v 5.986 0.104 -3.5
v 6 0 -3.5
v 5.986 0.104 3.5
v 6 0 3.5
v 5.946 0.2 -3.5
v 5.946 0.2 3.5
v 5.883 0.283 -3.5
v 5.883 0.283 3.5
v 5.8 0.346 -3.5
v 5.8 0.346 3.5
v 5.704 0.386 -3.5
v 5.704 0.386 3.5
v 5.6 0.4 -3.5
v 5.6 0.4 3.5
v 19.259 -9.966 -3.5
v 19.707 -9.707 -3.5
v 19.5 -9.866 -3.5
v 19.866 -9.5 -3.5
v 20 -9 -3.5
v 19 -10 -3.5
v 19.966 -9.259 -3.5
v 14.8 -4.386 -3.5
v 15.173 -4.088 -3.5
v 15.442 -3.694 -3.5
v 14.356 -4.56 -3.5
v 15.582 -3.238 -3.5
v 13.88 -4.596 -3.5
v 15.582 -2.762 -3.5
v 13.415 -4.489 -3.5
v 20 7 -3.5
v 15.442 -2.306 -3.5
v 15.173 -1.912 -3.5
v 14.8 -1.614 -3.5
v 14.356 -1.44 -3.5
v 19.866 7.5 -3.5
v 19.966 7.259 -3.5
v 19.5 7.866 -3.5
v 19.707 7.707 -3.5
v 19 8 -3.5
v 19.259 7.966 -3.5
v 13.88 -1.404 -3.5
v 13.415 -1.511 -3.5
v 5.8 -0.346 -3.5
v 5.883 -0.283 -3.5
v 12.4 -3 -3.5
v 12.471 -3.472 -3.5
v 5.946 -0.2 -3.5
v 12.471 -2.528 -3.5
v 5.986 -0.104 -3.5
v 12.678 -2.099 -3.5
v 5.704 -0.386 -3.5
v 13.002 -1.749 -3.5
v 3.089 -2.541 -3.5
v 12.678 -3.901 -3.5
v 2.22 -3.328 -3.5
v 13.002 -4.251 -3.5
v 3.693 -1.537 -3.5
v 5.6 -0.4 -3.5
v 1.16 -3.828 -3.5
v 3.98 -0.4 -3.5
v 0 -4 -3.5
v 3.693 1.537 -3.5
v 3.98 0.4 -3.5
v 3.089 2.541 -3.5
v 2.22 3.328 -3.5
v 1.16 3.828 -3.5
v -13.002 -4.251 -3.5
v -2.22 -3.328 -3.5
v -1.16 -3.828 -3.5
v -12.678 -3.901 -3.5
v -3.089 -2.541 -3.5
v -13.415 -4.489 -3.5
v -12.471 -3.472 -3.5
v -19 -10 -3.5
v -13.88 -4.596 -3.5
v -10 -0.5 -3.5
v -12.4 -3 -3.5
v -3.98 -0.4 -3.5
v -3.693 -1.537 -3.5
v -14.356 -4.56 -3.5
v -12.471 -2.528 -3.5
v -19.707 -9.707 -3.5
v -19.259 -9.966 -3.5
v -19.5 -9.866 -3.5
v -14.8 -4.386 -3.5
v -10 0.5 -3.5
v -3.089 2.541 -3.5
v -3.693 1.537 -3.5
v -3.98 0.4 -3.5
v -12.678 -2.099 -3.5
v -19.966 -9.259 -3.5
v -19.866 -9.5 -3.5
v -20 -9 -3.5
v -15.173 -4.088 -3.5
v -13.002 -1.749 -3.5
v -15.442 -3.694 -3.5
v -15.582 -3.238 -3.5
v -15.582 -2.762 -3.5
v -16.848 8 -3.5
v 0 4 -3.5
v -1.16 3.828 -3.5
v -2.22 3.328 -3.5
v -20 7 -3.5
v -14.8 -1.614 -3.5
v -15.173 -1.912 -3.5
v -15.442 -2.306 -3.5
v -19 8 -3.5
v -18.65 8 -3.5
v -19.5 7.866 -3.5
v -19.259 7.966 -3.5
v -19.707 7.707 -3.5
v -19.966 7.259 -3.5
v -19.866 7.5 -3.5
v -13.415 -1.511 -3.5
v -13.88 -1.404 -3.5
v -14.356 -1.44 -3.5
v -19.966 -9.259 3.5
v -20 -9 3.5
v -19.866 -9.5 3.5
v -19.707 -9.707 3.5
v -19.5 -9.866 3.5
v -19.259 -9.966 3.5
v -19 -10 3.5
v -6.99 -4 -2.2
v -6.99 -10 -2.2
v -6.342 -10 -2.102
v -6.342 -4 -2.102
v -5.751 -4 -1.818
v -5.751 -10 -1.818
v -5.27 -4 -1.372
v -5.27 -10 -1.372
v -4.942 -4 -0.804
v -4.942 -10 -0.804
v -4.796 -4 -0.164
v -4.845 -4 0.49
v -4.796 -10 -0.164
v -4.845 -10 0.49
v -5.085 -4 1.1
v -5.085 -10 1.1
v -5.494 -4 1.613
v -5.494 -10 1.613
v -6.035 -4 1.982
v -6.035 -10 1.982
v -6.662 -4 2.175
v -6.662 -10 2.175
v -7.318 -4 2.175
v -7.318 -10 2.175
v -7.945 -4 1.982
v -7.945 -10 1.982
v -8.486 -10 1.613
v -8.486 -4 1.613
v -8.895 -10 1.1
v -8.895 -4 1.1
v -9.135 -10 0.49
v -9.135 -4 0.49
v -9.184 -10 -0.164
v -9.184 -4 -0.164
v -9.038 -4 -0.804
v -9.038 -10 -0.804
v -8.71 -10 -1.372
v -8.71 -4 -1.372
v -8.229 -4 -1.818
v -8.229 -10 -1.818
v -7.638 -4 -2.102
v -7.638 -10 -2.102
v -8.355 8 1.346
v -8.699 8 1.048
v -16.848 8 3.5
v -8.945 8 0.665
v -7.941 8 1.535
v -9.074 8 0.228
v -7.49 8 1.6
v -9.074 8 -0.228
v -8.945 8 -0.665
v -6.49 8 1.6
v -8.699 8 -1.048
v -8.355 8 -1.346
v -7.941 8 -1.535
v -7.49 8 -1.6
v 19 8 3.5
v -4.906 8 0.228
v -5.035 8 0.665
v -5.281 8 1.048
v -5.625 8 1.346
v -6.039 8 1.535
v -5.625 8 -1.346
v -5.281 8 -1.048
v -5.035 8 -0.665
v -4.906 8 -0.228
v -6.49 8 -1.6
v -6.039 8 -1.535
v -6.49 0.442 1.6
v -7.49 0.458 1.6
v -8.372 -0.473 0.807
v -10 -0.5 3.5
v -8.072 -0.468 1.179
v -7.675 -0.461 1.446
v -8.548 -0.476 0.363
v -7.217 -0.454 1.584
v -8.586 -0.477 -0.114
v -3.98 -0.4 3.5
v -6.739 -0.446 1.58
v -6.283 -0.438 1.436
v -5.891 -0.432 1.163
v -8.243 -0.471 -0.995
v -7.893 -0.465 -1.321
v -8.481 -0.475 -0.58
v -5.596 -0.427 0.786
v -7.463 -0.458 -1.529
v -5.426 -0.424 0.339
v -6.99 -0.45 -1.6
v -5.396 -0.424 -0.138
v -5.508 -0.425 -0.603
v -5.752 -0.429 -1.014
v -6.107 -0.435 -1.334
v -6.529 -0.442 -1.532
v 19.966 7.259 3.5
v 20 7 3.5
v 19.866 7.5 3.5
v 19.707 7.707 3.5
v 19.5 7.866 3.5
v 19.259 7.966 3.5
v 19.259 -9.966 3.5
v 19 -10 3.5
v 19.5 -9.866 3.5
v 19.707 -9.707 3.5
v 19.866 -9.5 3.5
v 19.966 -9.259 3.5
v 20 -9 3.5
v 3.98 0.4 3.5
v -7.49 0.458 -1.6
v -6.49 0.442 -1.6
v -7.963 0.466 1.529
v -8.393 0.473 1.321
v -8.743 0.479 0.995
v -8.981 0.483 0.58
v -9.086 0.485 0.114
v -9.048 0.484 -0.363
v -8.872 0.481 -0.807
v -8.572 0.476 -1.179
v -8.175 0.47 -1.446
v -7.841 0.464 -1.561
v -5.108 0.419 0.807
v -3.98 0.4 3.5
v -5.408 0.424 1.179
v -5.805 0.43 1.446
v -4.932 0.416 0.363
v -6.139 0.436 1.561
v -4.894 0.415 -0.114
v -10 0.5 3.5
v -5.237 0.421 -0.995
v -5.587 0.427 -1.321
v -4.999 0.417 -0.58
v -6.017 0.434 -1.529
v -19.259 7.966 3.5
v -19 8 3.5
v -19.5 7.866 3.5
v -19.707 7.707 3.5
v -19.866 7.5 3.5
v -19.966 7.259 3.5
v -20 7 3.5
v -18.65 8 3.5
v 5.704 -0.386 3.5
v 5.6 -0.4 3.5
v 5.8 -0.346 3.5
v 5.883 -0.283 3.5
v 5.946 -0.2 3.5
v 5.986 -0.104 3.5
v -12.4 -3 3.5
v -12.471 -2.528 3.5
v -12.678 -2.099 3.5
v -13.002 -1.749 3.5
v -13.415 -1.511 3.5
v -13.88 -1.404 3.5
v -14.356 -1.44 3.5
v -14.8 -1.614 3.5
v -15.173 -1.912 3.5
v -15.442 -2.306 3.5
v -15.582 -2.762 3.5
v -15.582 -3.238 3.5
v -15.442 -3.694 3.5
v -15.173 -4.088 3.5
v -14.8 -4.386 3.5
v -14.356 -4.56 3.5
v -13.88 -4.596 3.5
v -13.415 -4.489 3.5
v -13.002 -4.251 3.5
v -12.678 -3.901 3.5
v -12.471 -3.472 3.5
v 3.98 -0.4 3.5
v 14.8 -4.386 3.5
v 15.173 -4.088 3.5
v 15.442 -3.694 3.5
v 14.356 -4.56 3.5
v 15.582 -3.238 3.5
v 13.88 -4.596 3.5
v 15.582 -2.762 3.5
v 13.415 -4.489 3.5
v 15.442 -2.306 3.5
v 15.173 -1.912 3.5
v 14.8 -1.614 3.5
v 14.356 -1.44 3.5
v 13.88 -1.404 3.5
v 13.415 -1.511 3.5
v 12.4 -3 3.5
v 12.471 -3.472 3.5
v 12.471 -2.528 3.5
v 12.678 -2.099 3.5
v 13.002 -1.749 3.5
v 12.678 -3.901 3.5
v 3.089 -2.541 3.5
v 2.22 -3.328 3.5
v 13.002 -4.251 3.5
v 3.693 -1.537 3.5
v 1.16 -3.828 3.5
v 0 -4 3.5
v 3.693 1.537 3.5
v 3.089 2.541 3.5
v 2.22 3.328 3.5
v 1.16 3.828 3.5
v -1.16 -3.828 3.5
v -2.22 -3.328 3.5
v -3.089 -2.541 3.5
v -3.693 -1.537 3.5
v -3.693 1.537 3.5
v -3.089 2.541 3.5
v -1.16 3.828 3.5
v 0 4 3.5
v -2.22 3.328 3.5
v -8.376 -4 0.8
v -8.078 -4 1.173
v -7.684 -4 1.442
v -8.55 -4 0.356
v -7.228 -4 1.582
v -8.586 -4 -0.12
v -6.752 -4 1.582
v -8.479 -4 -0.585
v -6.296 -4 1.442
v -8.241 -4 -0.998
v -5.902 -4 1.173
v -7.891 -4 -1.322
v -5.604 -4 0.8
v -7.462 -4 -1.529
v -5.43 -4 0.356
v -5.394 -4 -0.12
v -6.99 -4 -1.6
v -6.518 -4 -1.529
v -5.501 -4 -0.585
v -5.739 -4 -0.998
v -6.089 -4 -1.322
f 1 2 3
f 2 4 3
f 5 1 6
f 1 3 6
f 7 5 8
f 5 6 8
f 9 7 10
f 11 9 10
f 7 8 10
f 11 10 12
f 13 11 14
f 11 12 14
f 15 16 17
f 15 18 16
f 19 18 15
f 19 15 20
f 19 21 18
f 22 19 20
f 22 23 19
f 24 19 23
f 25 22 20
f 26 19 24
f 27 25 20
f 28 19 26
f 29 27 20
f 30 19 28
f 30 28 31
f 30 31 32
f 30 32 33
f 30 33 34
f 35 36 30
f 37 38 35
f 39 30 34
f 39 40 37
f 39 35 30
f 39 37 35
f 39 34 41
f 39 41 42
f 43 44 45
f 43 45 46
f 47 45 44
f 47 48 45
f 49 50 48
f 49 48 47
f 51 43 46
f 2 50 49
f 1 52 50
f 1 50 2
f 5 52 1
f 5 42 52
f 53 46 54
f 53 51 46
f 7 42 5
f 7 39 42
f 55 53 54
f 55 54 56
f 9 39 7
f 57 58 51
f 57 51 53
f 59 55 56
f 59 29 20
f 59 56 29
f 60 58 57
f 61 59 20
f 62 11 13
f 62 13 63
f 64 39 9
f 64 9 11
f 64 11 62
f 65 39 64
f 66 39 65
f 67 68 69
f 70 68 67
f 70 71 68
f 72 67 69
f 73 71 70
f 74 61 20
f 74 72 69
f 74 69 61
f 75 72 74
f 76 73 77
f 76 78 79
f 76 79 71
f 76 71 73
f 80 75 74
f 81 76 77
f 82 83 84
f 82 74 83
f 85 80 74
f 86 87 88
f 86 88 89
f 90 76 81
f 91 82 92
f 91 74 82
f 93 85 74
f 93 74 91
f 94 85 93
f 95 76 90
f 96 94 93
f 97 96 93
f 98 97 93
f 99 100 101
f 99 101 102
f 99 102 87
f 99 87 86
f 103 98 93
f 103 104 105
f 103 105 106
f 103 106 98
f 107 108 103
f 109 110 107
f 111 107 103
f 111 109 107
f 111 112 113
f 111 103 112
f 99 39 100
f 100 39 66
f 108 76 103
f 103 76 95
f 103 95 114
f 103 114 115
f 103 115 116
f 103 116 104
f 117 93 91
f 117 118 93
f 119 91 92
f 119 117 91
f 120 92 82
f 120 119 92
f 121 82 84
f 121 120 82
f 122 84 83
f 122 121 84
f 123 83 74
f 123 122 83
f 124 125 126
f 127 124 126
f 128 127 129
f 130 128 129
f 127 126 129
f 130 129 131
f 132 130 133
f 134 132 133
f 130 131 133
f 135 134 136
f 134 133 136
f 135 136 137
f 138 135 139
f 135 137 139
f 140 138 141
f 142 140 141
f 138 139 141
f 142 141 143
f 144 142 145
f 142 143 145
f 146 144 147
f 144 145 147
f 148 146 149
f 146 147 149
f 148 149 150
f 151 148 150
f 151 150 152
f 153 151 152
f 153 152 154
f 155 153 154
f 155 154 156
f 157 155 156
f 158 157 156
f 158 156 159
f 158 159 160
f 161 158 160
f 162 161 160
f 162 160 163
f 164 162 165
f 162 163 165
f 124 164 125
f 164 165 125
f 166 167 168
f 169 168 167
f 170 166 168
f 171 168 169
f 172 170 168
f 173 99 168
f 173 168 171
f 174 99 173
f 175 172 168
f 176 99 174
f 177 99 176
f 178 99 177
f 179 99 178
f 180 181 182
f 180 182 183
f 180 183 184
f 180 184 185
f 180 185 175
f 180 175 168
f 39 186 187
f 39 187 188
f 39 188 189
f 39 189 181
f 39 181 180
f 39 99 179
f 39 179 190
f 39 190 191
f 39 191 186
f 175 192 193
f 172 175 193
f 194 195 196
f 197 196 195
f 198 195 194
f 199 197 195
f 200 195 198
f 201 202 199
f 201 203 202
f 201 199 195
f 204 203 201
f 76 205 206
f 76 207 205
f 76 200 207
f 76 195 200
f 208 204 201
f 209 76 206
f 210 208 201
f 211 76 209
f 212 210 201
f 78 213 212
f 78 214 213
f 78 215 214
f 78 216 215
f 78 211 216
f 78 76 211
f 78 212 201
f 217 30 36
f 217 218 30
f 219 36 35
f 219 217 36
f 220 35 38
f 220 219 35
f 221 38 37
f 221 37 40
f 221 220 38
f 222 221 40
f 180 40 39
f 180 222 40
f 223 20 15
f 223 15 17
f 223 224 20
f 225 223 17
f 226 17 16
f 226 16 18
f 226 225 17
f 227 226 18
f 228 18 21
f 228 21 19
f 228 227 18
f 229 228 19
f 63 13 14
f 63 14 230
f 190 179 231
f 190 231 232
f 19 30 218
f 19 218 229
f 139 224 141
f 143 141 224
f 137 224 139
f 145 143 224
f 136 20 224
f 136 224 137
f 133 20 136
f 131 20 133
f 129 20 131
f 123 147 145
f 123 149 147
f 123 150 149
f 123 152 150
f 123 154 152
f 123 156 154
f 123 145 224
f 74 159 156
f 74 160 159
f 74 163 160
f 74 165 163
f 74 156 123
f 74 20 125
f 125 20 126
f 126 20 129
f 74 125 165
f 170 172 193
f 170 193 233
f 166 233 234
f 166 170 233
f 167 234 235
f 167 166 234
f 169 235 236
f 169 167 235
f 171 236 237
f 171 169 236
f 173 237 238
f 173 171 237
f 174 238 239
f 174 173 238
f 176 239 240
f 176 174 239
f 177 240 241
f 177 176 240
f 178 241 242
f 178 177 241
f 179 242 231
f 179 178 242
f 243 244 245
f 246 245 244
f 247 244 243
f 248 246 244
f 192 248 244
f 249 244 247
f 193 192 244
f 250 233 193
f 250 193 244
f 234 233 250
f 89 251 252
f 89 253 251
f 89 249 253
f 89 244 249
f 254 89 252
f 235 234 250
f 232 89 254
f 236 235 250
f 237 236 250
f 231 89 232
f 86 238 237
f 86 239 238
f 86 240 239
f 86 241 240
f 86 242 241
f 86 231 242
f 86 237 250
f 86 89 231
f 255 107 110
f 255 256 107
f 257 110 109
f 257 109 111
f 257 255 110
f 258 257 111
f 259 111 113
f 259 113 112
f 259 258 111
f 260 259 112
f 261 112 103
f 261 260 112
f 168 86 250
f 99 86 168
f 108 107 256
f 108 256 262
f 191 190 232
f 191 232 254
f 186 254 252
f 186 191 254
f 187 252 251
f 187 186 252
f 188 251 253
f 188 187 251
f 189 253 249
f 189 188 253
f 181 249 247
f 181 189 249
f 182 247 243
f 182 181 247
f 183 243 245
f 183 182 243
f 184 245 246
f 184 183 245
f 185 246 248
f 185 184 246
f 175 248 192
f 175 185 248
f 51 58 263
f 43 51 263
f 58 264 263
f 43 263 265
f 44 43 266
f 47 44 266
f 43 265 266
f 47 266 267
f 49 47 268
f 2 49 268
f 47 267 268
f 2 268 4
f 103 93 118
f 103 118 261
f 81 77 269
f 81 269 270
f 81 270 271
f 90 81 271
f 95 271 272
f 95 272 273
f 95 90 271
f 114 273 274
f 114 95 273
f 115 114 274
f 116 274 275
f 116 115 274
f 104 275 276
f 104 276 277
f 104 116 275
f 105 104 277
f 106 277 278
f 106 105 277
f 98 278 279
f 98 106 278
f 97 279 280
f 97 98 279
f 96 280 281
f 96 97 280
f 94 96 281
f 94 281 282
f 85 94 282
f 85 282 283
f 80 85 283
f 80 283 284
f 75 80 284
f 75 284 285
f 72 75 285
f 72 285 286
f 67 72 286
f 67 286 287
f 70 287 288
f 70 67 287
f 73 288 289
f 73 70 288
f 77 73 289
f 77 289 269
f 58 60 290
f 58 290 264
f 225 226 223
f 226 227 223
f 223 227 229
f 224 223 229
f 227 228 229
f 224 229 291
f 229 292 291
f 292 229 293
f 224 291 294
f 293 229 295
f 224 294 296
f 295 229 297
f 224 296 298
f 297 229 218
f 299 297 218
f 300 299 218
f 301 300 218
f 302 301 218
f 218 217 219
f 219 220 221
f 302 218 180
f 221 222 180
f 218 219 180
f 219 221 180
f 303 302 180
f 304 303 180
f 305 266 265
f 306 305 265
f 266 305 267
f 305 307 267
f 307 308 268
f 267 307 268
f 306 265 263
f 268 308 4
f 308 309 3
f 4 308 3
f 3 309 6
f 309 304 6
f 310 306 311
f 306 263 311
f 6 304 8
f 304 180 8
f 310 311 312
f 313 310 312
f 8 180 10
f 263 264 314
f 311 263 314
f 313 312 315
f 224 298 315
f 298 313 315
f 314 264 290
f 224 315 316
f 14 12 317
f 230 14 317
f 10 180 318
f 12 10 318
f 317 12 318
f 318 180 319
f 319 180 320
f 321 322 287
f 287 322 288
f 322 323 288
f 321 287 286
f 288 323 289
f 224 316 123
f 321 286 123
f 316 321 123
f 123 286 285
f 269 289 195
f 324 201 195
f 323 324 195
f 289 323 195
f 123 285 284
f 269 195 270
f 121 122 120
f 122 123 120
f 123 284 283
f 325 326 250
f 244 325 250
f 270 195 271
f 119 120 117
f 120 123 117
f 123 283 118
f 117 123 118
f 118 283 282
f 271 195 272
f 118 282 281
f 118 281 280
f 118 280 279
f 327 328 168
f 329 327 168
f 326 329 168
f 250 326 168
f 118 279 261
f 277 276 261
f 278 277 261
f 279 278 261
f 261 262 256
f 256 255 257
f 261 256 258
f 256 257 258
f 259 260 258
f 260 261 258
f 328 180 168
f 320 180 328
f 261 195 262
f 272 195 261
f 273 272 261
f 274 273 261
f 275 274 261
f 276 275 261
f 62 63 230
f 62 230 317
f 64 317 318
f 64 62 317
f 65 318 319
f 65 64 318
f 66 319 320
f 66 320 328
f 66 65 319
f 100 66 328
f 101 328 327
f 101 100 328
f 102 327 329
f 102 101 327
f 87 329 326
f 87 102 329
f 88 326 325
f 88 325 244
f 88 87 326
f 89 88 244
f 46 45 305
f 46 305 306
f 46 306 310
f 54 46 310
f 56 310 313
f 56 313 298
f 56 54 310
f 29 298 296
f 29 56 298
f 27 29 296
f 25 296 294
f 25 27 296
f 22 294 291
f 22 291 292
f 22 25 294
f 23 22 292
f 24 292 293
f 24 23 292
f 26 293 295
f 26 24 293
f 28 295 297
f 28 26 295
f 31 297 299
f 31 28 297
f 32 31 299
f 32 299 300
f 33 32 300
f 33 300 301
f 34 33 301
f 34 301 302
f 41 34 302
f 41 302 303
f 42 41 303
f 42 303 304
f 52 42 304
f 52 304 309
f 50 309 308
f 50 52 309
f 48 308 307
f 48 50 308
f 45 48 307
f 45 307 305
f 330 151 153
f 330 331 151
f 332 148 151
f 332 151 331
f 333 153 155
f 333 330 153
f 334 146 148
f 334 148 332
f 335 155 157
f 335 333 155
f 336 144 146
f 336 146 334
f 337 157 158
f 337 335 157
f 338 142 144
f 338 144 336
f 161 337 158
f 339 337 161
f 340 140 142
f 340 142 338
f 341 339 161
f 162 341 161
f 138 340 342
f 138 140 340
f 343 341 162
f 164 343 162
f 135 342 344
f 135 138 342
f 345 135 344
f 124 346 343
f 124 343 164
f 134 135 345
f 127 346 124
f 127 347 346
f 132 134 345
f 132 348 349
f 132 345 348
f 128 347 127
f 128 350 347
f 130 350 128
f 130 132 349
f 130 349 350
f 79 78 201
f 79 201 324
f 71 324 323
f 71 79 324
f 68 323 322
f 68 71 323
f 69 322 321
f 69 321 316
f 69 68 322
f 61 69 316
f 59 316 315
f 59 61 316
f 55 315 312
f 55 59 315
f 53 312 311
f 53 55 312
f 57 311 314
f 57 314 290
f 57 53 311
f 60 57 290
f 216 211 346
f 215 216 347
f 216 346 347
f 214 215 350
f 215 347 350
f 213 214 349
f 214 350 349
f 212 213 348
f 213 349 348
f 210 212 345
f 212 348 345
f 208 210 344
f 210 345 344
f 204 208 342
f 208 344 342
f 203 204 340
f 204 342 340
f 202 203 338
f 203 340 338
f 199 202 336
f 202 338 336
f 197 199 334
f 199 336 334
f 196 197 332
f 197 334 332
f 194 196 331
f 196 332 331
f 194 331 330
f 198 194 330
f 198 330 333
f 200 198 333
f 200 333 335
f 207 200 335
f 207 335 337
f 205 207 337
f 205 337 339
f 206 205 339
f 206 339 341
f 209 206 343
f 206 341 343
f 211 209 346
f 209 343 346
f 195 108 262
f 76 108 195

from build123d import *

# Parameters (mm, degrees)
BOSS_EXTRUDE1_DEPTH      = 3.5
BOSS_EXTRUDE1_DEPTH_BACK = 3.5
SKETCH1_R                = 1.6
CUT_EXTRUDE1_REACH       = 29.134
SKETCH3_R                = 1.6
SKETCH3_3_R              = 2.2
SKETCH3_3_R_2            = 1.6
CUT_EXTRUDE2_DEPTH       = 6
CUT_EXTRUDE3_REACH       = 29.134
FILLET1_R                = 1
FILLET2_R                = 0.4


with BuildPart() as part:
    # Sketch1 → Boss-Extrude1 (new, two sides: drawn at the far end of the back side and taken through both)
    with BuildSketch(Plane.XY.offset(-BOSS_EXTRUDE1_DEPTH_BACK)):
        with BuildLine():
            Line((-20, 8), (-18.64966284, 8))
            Line((-18.64966284, 8), (-10, -0.5))
            Line((-10, -0.5), (-3.979949748, -0.4))
            ThreePointArc((-3.979949748, -0.4), (0, -4), (3.979949748, -0.4))
            Line((3.979949748, -0.4), (6, -0.4))
            Line((6, -0.4), (6, 0.4))
            Line((6, 0.4), (3.979949748, 0.4))
            ThreePointArc((3.979949748, 0.4), (0, 4), (-3.979949748, 0.4))
            Line((-3.979949748, 0.4), (-10, 0.5))
            Line((-10, 0.5), (-16.848441102, 8))
            Line((-16.848441102, 8), (20, 8))
            Line((20, 8), (20, -10))
            Line((20, -10), (-20, -10))
            Line((-20, -10), (-20, 8))
        make_face()
        with Locations((-14, -3)):
            Circle(SKETCH1_R, mode=Mode.SUBTRACT)
        with Locations(Location((14, -3, 0), (0, 0, 180))):
            Circle(SKETCH1_R, mode=Mode.SUBTRACT)
    extrude(amount=BOSS_EXTRUDE1_DEPTH + BOSS_EXTRUDE1_DEPTH_BACK)

    # Cut-Extrude1: up to this plane
    cut_extrude1_end = Plane(origin=(-10, -0.5, -3.5), z_dir=(-0.016608865731892127, 0.9998620632762801, 0))
    # Sketch3 → Cut-Extrude1 (cut, up to the surface)
    with BuildSketch(Plane.XZ.offset(10), mode=Mode.PRIVATE) as cut_extrude1_sk1:
        with Locations(Location((-6.989974874, 0, 0), (0, 0, 270))):
            Circle(SKETCH3_R)
    cut_extrude1_tool1 = split(extrude(cut_extrude1_sk1.sketch, amount=-CUT_EXTRUDE1_REACH, mode=Mode.PRIVATE), bisect_by=cut_extrude1_end, keep=Keep.BOTH, mode=Mode.PRIVATE)
    add(cut_extrude1_tool1.solids().sort_by_distance((-6.989975, -10, 0))[0], mode=Mode.SUBTRACT)

    # Sketch3<3> → Cut-Extrude2 (cut)
    with BuildSketch(Plane.XZ.offset(10)):
        with Locations(Location((-6.989974874, 0, 0), (0, 0, 270))):
            Circle(SKETCH3_3_R)
        with Locations(Location((-6.989974874, 0, 0), (0, 0, 270))):
            Circle(SKETCH3_3_R_2, mode=Mode.SUBTRACT)
    extrude(amount=-CUT_EXTRUDE2_DEPTH, mode=Mode.SUBTRACT)

    # Cut-Extrude3: up to this plane
    cut_extrude3_end = Plane(origin=(-10, 0.5, -3.5), z_dir=(-0.016608865731892127, -0.9998620632762801, 0))
    # Sketch4 → Cut-Extrude3 (cut, up to the surface)
    with BuildSketch(Plane(origin=(0, 8, 0), x_dir=(1, 0, 0), z_dir=(0, 1, 0)), mode=Mode.PRIVATE) as cut_extrude3_sk1:
        with BuildLine():
            Line((-7.489974874, 1.6), (-6.489974874, 1.6))
            ThreePointArc((-6.489974874, 1.6), (-4.889974874, 0), (-6.489974874, -1.6))
            Line((-6.489974874, -1.6), (-7.489974874, -1.6))
            ThreePointArc((-7.489974874, -1.6), (-9.089974874, 0), (-7.489974874, 1.6))
        make_face()
    cut_extrude3_tool1 = split(extrude(cut_extrude3_sk1.sketch, amount=-CUT_EXTRUDE3_REACH, mode=Mode.PRIVATE), bisect_by=cut_extrude3_end, keep=Keep.BOTH, mode=Mode.PRIVATE)
    add(cut_extrude3_tool1.solids().sort_by_distance((-6.989975, 8, 0))[0], mode=Mode.SUBTRACT)

    # Fillet1
    fillet1_edges = [part.edges().sort_by_distance(p)[0] for p in [
        (20, 8, 0),
        (20, -10, 0),
        (-20, -10, 0),
        (-20, 8, 0),
    ]]
    fillet(fillet1_edges, radius=FILLET1_R)

    # Fillet2
    fillet2_edges = [part.edges().sort_by_distance(p)[0] for p in [
        (6, -0.4, 0),
        (6, 0.4, 0),
    ]]
    fillet(fillet2_edges, radius=FILLET2_R - 0.0001)  # a hair under: the kernel refuses the full size


solid = part.part
